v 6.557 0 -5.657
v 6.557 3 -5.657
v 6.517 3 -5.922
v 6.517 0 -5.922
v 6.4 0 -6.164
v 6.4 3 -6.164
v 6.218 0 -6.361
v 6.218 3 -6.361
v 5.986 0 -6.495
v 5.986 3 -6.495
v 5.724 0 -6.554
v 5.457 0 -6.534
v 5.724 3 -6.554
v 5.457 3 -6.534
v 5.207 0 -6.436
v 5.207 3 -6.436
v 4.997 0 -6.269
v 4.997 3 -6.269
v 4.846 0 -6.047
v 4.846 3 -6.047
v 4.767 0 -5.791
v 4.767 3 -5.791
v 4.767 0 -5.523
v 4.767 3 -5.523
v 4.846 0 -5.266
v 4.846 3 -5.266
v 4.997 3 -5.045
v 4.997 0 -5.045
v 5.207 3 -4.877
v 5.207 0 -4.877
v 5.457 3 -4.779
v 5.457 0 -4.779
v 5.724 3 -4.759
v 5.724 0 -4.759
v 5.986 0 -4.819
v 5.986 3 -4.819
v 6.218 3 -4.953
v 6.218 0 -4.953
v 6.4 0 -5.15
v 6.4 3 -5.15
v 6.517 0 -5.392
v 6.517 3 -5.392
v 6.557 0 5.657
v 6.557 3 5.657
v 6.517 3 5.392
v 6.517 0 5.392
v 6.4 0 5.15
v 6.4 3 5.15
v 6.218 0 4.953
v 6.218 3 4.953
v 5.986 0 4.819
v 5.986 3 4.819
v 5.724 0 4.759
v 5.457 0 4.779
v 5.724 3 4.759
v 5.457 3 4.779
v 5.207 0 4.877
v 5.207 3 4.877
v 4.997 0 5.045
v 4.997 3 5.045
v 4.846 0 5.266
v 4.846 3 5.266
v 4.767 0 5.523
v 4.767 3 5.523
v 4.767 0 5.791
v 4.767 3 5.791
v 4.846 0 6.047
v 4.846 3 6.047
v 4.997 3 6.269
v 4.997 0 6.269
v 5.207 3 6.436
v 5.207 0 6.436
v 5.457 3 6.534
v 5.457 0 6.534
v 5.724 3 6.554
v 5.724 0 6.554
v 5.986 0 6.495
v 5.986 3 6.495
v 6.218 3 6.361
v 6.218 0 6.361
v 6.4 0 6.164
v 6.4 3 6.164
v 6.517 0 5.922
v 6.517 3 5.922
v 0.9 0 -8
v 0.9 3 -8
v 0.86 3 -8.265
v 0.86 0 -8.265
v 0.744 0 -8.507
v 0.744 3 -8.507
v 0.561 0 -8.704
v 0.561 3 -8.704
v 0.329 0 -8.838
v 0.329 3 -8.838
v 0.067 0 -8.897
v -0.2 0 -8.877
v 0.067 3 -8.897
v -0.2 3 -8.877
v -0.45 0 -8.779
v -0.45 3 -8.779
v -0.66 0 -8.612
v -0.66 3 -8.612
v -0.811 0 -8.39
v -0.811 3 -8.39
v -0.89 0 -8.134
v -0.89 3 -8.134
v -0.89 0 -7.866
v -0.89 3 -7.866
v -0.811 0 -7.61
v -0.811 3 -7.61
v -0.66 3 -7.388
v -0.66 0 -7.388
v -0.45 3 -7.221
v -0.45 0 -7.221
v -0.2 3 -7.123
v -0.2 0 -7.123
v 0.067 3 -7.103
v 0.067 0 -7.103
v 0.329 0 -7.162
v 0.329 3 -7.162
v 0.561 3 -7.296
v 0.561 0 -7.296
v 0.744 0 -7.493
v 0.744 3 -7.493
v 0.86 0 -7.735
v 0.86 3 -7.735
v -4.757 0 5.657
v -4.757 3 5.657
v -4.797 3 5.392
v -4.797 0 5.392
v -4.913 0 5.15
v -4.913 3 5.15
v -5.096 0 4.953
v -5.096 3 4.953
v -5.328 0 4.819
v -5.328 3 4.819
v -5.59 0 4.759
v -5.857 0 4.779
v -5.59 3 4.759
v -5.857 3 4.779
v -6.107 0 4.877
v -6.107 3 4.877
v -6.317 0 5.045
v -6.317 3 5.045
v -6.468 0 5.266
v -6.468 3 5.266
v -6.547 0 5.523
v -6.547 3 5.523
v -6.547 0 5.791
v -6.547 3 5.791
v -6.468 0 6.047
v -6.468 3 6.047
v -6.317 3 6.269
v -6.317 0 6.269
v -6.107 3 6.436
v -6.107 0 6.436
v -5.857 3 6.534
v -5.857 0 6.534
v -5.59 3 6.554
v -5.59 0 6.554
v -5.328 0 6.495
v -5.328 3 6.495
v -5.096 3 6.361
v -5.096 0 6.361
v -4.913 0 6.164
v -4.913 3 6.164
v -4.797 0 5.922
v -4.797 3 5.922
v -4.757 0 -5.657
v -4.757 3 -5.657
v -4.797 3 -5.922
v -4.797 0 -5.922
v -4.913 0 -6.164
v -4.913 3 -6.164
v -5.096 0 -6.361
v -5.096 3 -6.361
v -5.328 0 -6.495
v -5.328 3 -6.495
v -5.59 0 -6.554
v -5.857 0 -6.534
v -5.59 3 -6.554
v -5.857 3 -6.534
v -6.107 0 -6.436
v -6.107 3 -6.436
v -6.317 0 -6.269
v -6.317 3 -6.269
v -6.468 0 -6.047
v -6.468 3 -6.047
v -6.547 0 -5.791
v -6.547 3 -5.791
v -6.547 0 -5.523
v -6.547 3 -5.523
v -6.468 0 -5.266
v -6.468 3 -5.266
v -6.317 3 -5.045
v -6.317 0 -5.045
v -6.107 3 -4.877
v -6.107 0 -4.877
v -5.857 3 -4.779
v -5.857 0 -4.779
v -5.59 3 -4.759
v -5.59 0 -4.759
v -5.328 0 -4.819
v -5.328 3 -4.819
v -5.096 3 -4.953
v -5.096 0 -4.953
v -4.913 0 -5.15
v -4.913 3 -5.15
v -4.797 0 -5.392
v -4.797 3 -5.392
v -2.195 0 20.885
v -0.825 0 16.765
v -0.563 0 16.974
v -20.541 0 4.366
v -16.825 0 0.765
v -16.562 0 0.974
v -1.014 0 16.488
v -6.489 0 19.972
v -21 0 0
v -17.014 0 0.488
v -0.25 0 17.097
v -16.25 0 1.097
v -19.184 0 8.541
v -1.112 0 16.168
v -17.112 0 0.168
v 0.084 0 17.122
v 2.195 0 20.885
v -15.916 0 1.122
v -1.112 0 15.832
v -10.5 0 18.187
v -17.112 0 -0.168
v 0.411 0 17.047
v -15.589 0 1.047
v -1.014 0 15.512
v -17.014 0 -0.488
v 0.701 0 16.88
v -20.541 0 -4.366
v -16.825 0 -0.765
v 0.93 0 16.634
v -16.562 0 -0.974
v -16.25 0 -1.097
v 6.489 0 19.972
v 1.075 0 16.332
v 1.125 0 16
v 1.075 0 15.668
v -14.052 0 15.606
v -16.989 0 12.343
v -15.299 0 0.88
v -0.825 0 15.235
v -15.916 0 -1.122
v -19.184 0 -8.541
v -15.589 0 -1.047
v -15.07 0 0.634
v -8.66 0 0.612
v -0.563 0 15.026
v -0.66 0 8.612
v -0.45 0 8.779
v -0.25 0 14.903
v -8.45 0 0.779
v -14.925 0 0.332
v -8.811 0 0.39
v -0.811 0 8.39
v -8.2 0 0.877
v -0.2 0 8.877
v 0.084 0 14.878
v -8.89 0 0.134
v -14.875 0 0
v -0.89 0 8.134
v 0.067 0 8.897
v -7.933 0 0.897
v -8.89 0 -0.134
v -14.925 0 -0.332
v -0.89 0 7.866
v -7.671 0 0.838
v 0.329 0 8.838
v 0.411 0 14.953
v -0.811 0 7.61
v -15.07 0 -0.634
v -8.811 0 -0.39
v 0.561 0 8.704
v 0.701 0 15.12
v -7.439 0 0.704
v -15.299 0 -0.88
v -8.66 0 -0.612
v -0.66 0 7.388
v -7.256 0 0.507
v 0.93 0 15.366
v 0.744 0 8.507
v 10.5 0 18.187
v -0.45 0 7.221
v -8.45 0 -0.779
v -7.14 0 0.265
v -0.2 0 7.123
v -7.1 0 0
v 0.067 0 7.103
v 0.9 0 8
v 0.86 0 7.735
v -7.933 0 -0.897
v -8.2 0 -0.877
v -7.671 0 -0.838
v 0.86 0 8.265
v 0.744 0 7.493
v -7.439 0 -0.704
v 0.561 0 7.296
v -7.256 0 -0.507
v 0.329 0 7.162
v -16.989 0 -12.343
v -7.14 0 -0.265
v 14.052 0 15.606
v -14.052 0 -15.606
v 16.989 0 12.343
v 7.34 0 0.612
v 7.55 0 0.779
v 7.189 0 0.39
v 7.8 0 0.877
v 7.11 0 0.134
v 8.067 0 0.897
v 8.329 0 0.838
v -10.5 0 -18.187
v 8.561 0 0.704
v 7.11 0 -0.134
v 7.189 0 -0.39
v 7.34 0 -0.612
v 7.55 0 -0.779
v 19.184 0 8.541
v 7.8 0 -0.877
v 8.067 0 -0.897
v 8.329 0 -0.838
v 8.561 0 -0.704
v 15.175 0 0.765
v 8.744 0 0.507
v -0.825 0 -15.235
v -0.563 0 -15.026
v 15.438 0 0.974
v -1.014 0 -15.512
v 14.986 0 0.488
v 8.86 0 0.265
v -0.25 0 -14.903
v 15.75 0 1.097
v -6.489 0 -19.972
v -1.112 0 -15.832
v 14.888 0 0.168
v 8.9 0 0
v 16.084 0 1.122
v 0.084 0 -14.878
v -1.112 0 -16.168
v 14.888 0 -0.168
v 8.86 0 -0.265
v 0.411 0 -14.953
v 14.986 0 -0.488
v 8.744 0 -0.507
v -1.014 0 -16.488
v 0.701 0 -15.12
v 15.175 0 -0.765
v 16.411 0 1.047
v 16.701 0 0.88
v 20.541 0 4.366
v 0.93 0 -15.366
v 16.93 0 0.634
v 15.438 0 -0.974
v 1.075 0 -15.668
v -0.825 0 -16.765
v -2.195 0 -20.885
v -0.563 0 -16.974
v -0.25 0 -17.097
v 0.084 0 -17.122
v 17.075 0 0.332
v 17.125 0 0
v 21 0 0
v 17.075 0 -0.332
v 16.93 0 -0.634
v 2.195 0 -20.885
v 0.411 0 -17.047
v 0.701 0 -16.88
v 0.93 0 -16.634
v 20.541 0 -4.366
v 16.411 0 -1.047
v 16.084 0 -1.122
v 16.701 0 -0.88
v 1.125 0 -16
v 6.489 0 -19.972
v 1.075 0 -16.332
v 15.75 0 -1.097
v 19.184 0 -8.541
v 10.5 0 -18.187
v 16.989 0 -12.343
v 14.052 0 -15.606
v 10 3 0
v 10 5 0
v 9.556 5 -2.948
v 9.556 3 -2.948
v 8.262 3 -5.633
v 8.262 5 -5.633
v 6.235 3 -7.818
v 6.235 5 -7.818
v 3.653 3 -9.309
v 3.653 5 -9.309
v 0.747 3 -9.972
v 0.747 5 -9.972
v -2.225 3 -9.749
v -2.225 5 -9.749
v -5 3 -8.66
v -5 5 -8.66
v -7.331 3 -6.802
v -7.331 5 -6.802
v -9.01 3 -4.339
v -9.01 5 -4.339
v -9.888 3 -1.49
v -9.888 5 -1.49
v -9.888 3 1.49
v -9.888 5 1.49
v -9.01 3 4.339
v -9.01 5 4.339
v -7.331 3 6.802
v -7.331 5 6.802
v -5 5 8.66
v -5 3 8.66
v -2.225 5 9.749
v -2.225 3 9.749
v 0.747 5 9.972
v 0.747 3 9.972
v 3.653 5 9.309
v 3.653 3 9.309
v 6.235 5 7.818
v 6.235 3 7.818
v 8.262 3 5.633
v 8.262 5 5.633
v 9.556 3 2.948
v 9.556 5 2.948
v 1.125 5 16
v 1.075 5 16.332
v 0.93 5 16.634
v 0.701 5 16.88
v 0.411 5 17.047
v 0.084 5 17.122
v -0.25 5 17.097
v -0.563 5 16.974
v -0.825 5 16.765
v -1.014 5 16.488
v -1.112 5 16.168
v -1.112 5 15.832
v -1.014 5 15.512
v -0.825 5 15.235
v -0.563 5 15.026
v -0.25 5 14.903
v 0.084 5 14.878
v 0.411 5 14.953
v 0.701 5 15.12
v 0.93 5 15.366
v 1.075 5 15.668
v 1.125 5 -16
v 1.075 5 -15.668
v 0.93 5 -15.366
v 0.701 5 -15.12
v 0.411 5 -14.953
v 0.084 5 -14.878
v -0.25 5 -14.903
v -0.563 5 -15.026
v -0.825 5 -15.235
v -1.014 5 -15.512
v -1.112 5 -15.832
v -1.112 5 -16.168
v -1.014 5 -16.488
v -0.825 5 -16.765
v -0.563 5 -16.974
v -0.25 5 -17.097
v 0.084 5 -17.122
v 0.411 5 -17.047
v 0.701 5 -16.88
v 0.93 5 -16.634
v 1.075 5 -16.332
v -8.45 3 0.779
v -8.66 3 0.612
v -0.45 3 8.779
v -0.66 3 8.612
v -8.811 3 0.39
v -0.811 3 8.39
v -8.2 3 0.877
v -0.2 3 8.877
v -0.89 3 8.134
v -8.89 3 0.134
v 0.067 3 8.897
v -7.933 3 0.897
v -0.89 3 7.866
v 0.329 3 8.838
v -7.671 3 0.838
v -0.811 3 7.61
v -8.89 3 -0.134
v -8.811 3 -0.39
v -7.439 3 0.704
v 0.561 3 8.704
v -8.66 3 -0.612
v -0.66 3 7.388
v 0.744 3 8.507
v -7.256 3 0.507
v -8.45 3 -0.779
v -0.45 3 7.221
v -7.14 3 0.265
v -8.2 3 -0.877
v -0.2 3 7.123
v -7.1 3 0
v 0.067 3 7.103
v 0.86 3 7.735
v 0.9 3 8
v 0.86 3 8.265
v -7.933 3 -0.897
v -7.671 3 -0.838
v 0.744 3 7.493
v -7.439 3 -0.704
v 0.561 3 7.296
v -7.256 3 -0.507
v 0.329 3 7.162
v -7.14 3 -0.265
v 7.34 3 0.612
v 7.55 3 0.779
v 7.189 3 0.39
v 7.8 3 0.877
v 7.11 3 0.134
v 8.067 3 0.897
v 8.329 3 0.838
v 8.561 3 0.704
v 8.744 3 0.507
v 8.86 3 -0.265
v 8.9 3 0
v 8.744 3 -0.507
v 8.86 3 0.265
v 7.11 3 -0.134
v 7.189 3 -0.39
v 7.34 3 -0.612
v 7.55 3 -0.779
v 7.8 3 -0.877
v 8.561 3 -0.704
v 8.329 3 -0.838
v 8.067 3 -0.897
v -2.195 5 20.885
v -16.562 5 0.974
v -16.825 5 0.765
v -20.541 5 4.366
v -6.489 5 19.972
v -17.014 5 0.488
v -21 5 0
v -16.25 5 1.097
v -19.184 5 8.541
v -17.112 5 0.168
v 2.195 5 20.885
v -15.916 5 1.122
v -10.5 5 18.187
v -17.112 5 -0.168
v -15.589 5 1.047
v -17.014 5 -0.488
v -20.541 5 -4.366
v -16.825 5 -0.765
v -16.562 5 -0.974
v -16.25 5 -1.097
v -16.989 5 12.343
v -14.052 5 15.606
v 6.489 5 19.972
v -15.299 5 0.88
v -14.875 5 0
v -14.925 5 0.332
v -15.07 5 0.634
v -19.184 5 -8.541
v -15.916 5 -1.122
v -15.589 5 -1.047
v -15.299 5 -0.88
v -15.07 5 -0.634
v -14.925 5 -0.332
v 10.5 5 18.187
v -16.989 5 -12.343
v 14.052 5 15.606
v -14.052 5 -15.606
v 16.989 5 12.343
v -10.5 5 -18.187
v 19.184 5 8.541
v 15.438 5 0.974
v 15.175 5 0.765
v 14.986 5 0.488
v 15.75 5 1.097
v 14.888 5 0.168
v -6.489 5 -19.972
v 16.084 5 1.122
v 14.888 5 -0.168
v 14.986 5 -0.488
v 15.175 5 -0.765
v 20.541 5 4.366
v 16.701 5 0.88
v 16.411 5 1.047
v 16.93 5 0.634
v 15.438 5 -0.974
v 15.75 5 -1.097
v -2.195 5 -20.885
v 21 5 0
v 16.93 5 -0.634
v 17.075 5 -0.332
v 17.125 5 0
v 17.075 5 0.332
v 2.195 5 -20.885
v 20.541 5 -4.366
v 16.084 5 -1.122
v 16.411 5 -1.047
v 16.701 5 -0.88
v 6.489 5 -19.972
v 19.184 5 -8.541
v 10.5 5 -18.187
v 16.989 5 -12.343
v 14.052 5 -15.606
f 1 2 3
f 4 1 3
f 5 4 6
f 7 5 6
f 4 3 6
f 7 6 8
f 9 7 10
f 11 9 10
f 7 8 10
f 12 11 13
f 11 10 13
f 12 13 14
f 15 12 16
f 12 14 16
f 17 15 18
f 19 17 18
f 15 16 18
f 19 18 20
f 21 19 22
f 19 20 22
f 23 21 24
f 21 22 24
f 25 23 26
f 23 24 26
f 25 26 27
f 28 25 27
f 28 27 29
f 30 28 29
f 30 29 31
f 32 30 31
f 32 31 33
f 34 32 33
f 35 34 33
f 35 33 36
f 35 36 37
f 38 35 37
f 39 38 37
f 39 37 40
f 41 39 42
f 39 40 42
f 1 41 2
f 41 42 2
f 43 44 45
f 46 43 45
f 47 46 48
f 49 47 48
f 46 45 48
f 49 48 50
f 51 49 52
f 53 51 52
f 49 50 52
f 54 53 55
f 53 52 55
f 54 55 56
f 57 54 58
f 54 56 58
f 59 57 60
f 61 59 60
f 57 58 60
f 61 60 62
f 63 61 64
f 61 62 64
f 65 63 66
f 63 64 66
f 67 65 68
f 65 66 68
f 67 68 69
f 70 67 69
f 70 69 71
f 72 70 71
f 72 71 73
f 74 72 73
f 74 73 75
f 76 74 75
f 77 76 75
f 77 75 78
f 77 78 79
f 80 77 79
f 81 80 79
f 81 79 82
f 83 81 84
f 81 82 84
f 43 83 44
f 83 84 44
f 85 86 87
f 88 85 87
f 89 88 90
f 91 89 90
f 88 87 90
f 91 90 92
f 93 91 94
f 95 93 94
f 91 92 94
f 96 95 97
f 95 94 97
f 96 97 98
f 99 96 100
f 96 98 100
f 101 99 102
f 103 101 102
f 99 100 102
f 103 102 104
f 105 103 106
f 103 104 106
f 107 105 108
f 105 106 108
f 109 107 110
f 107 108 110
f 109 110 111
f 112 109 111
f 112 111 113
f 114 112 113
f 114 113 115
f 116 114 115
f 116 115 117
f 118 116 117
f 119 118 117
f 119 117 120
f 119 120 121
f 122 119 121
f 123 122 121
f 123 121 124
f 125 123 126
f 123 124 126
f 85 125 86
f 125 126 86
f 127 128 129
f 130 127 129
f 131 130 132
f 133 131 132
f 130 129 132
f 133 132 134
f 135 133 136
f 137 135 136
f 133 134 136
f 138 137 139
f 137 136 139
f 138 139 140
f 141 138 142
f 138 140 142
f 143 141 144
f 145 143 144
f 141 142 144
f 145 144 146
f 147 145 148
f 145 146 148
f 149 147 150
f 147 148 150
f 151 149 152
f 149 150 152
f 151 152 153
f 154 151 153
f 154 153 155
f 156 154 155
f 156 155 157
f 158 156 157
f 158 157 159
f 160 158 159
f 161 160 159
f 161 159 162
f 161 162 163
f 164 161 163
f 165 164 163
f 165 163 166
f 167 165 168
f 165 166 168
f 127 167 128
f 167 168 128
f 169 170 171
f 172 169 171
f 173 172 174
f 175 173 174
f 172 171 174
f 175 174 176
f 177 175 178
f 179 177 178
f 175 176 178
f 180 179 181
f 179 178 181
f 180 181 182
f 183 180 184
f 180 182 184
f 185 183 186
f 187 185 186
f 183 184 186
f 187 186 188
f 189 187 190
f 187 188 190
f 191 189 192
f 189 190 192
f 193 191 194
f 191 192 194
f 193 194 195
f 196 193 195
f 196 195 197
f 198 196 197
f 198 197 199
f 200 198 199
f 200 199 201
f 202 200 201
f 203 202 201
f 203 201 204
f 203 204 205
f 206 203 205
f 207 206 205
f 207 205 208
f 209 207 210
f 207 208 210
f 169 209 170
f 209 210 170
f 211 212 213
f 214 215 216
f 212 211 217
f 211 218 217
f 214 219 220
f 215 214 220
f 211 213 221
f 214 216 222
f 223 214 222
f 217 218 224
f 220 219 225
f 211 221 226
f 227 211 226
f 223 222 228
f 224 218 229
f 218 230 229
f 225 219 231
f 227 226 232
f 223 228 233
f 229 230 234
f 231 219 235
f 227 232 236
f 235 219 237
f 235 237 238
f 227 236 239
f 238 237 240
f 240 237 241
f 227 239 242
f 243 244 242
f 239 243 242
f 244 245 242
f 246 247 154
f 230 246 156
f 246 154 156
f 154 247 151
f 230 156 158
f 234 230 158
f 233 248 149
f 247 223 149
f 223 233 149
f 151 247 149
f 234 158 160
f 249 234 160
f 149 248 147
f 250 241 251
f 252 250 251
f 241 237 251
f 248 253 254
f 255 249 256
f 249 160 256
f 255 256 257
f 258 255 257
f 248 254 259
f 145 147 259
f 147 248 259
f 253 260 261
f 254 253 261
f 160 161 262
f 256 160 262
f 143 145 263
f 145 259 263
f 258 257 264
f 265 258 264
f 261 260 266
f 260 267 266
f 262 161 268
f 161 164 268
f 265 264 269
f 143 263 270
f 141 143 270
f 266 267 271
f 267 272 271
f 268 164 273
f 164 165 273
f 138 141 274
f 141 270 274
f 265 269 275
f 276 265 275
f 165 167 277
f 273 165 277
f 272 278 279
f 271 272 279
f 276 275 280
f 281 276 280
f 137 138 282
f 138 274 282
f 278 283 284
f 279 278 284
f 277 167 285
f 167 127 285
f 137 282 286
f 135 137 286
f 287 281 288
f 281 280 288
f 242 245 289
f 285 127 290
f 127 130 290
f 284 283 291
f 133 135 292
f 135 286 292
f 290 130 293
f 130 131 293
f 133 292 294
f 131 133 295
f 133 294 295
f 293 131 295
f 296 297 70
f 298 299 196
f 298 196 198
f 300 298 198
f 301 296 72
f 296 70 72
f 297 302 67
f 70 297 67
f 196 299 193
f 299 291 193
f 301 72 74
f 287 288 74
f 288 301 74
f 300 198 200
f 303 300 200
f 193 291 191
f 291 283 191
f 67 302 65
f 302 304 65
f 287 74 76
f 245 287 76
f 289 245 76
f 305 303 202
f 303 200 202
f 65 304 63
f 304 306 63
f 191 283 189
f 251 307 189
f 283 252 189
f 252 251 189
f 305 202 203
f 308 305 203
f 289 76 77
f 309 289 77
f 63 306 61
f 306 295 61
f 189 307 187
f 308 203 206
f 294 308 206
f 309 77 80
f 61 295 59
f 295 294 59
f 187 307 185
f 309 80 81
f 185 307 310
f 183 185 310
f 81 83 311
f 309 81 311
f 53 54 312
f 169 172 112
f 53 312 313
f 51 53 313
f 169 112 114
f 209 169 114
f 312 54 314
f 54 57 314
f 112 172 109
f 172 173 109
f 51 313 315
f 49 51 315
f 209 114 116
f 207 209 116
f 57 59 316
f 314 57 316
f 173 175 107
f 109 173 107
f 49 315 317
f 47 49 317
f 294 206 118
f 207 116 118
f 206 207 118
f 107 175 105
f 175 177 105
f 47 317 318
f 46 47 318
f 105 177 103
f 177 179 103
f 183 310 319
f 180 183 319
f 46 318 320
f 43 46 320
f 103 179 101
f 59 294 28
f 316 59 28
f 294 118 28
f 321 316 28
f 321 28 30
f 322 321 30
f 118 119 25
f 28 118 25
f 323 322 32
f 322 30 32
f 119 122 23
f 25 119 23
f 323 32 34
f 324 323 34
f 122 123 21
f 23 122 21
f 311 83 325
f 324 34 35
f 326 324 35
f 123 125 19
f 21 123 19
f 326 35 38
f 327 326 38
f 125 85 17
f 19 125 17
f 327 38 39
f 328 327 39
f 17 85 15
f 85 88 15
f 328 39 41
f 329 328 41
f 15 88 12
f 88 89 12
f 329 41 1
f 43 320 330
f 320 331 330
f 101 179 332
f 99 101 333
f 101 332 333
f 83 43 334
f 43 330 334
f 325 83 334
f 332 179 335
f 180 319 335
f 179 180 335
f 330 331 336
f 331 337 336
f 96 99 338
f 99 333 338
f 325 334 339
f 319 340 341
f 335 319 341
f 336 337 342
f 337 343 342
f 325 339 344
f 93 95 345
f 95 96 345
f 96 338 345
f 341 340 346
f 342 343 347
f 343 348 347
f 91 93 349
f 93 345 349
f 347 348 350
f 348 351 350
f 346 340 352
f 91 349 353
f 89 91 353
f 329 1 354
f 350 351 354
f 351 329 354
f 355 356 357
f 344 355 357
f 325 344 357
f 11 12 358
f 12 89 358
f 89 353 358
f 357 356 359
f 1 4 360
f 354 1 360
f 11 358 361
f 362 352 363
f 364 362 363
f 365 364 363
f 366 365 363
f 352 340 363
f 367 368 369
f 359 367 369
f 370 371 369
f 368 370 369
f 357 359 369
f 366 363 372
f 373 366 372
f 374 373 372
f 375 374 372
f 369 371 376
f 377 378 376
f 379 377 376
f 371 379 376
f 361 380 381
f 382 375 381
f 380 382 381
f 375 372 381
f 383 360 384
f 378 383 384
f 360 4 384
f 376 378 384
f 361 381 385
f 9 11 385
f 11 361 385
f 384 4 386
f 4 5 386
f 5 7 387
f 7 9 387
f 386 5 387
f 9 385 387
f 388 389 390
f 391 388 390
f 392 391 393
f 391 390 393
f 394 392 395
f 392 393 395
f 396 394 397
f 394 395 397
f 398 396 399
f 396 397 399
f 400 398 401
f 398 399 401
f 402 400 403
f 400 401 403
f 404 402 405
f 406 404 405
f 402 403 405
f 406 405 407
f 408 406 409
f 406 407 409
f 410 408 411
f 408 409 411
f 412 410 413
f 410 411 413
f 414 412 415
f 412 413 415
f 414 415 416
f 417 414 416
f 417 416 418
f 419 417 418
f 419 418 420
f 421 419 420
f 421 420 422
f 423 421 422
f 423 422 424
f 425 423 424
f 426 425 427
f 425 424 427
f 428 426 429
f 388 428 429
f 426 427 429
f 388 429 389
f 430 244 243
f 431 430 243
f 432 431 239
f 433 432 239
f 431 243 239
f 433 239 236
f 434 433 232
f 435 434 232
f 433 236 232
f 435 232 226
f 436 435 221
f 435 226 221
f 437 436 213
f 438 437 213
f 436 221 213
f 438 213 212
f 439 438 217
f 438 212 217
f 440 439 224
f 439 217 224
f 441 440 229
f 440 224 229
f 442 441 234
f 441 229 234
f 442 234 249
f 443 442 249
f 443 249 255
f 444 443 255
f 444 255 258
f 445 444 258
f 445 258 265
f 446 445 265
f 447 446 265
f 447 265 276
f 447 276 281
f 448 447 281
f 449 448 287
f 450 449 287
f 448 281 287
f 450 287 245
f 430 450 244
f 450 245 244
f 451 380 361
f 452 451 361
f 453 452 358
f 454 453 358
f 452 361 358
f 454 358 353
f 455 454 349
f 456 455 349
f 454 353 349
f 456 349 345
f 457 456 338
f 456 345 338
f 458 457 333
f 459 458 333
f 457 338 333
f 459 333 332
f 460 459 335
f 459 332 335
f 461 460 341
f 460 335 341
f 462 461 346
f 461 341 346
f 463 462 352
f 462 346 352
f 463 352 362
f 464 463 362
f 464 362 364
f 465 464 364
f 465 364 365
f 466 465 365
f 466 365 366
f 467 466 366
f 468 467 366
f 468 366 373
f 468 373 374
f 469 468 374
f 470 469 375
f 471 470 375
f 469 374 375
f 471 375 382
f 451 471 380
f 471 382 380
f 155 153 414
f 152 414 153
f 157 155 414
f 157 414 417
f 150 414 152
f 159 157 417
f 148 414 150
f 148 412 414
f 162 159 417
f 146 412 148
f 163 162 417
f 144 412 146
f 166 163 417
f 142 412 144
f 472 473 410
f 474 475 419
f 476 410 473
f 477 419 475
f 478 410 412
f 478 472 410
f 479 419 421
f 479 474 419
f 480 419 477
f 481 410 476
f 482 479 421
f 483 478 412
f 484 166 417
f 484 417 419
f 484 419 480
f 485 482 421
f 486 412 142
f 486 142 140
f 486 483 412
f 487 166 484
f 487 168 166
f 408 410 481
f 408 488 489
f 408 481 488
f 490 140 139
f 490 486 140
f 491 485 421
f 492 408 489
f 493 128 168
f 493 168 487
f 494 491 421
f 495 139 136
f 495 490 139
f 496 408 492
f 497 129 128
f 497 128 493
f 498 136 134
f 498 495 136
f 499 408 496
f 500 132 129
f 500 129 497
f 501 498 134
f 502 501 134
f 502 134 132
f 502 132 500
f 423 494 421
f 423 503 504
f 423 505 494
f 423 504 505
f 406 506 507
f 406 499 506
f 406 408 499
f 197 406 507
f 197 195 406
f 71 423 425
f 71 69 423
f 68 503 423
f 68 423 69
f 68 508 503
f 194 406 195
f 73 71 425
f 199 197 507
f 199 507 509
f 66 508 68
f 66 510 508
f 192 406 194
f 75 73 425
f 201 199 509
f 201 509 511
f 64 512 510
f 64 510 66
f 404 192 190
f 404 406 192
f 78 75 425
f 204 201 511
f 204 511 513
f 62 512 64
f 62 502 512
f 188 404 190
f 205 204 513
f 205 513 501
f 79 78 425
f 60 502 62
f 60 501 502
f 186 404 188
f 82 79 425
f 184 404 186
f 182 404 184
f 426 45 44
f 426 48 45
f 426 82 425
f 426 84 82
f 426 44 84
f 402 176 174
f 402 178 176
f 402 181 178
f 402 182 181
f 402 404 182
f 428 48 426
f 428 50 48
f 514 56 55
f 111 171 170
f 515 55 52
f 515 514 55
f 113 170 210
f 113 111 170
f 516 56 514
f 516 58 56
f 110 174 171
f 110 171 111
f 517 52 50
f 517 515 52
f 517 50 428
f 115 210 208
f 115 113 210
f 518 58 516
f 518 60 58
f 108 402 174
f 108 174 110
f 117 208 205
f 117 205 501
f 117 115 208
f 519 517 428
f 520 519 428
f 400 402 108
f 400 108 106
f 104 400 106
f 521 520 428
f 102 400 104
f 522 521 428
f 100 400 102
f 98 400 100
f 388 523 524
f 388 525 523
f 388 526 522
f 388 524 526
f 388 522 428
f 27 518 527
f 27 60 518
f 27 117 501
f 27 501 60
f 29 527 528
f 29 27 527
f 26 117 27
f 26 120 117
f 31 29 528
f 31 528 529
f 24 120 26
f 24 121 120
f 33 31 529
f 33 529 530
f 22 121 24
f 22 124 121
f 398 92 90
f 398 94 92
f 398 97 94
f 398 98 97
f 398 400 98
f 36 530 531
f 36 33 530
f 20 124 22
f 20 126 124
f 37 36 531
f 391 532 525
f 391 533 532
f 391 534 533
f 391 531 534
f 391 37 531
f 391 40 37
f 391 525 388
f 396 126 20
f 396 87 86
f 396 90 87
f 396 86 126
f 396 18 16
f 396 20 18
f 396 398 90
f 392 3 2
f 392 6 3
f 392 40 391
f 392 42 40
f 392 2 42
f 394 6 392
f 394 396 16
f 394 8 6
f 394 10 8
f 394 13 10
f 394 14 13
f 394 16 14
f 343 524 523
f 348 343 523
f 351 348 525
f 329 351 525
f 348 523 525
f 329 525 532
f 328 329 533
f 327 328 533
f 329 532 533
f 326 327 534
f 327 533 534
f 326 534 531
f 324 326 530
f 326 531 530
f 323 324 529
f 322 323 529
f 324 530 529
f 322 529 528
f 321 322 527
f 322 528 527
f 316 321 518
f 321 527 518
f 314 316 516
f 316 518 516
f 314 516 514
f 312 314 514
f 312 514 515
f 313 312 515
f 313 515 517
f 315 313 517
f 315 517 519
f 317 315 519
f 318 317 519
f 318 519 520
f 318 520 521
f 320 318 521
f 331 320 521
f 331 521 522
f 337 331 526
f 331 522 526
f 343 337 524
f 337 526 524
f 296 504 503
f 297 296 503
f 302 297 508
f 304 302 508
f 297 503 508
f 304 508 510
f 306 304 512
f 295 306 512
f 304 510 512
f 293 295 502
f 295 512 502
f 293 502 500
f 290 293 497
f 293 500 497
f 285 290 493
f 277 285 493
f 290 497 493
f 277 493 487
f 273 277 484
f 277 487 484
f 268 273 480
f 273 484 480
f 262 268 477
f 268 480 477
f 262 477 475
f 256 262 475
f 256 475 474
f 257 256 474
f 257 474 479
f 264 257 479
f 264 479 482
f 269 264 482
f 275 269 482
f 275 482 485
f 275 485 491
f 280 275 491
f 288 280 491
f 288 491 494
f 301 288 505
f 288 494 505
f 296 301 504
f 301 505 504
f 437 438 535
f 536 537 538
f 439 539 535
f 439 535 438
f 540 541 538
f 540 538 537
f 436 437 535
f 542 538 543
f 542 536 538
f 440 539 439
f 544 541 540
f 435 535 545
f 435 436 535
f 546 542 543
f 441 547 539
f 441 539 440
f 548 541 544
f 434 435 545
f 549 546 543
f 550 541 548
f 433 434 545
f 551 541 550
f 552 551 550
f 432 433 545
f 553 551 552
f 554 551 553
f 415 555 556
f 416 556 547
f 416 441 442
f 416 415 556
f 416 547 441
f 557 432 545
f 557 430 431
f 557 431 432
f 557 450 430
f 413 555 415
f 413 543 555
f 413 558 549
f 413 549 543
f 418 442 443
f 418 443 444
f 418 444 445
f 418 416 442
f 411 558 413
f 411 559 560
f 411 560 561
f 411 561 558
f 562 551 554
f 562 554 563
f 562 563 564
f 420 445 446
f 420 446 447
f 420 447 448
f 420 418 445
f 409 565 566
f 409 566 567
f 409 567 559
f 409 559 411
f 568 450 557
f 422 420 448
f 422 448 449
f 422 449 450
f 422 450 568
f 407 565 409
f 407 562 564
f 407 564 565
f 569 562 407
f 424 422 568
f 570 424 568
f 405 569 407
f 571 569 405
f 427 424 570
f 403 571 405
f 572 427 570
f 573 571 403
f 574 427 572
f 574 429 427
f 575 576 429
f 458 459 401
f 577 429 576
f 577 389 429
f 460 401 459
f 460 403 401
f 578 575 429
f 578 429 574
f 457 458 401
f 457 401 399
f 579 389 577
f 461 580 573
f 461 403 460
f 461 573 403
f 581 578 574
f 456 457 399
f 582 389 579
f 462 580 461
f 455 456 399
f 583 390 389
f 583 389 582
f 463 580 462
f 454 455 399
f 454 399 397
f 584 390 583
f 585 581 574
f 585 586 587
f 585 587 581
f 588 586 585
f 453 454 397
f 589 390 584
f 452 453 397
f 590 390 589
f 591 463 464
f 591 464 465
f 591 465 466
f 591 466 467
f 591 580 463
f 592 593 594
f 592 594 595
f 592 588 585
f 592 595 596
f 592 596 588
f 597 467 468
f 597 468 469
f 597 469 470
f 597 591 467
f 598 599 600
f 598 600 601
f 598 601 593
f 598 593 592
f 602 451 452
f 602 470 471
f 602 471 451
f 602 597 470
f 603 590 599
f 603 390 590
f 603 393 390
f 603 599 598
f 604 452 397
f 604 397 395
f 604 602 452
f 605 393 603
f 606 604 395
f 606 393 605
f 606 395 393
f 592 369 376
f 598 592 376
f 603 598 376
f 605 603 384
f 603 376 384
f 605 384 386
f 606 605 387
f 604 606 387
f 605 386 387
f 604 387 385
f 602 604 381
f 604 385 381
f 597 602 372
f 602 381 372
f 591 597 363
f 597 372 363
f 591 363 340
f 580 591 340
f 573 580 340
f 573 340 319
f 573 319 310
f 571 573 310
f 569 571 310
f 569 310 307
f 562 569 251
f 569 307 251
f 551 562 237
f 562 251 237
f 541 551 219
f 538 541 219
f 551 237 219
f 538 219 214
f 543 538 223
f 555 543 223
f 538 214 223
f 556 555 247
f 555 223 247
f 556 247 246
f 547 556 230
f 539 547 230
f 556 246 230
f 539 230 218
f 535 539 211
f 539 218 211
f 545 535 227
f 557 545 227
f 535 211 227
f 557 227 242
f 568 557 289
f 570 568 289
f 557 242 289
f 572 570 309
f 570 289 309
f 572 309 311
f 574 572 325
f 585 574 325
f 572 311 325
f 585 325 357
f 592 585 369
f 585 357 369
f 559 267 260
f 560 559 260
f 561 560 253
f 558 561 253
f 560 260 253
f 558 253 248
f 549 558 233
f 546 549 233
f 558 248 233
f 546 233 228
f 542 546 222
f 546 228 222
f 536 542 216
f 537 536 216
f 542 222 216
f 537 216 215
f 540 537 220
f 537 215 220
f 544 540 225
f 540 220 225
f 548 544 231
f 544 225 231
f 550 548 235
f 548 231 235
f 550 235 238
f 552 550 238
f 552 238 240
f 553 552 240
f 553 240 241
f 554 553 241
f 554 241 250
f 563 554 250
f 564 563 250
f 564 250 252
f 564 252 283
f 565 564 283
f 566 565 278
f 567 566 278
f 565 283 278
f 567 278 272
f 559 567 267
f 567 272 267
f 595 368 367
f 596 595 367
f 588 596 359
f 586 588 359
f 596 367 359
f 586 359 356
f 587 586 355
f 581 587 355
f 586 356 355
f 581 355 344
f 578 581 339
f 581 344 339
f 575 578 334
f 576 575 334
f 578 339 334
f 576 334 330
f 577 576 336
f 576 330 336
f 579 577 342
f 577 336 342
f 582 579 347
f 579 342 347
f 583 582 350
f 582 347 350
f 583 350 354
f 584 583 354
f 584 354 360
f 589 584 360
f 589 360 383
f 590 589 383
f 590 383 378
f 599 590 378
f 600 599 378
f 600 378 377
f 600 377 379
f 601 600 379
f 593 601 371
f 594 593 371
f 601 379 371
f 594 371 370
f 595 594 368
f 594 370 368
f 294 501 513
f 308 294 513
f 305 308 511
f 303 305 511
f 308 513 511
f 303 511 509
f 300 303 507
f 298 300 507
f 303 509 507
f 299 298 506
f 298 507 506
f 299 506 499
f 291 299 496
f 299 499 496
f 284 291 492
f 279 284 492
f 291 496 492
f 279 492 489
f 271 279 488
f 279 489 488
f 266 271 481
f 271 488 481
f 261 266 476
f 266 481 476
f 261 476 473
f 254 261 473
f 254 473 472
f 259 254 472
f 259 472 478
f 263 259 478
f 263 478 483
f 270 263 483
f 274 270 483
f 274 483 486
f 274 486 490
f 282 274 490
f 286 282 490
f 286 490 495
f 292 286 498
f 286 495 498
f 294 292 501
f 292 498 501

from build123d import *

# Parameters (mm, degrees)
SKETCH_1_R          = 21
EXTRUDE_1_DEPTH     = 5
SKETCH_2_R          = 10
CUT_EXTRUDE_1_DEPTH = 2
SKETCH_3_R          = 0.9
CUT_EXTRUDE_2_DEPTH = 3
SKETCH_4_R          = 1.125
CUT_EXTRUDE_3_DEPTH = 5


with BuildPart() as part:
    # 스케치1 → 보스-돌출1 (new body)
    with BuildSketch(Plane(origin=(0, 0, 0), x_dir=(1, 0, 0), z_dir=(0, 1, 0))):
        Circle(SKETCH_1_R)
    extrude(amount=EXTRUDE_1_DEPTH)

    # 스케치2 → 컷-돌출1 (cut)
    with BuildSketch(Plane(origin=(0, 5, 0), x_dir=(1, 0, 0), z_dir=(0, 1, 0))):
        Circle(SKETCH_2_R)
    extrude(amount=-CUT_EXTRUDE_1_DEPTH, mode=Mode.SUBTRACT)

    # 스케치3 → 컷-돌출2 (cut)
    with BuildSketch(Plane(origin=(0, 3, 0), x_dir=(1, 0, 0), z_dir=(0, 1, 0))):
        with Locations((5.656854249, 5.656854249)):
            Circle(SKETCH_3_R)
        with Locations((8, 0)):
            Circle(SKETCH_3_R)
        with Locations((0, 8)):
            Circle(SKETCH_3_R)
        with Locations((5.656854249, -5.656854249)):
            Circle(SKETCH_3_R)
        with Locations((0, -8)):
            Circle(SKETCH_3_R)
        with Locations((-5.656854249, -5.656854249)):
            Circle(SKETCH_3_R)
        with Locations((-8, 0)):
            Circle(SKETCH_3_R)
        with Locations((-5.656854249, 5.656854249)):
            Circle(SKETCH_3_R)
    extrude(amount=-CUT_EXTRUDE_2_DEPTH, mode=Mode.SUBTRACT)

    # 스케치4 → 컷-돌출3 (cut)
    with BuildSketch(Plane.XZ):
        with Locations((0, -16)):
            Circle(SKETCH_4_R)
        with Locations((-16, 0)):
            Circle(SKETCH_4_R)
        with Locations((0, 16)):
            Circle(SKETCH_4_R)
        with Locations((16, 0)):
            Circle(SKETCH_4_R)
    extrude(amount=-CUT_EXTRUDE_3_DEPTH, mode=Mode.SUBTRACT)


solid = part.part
